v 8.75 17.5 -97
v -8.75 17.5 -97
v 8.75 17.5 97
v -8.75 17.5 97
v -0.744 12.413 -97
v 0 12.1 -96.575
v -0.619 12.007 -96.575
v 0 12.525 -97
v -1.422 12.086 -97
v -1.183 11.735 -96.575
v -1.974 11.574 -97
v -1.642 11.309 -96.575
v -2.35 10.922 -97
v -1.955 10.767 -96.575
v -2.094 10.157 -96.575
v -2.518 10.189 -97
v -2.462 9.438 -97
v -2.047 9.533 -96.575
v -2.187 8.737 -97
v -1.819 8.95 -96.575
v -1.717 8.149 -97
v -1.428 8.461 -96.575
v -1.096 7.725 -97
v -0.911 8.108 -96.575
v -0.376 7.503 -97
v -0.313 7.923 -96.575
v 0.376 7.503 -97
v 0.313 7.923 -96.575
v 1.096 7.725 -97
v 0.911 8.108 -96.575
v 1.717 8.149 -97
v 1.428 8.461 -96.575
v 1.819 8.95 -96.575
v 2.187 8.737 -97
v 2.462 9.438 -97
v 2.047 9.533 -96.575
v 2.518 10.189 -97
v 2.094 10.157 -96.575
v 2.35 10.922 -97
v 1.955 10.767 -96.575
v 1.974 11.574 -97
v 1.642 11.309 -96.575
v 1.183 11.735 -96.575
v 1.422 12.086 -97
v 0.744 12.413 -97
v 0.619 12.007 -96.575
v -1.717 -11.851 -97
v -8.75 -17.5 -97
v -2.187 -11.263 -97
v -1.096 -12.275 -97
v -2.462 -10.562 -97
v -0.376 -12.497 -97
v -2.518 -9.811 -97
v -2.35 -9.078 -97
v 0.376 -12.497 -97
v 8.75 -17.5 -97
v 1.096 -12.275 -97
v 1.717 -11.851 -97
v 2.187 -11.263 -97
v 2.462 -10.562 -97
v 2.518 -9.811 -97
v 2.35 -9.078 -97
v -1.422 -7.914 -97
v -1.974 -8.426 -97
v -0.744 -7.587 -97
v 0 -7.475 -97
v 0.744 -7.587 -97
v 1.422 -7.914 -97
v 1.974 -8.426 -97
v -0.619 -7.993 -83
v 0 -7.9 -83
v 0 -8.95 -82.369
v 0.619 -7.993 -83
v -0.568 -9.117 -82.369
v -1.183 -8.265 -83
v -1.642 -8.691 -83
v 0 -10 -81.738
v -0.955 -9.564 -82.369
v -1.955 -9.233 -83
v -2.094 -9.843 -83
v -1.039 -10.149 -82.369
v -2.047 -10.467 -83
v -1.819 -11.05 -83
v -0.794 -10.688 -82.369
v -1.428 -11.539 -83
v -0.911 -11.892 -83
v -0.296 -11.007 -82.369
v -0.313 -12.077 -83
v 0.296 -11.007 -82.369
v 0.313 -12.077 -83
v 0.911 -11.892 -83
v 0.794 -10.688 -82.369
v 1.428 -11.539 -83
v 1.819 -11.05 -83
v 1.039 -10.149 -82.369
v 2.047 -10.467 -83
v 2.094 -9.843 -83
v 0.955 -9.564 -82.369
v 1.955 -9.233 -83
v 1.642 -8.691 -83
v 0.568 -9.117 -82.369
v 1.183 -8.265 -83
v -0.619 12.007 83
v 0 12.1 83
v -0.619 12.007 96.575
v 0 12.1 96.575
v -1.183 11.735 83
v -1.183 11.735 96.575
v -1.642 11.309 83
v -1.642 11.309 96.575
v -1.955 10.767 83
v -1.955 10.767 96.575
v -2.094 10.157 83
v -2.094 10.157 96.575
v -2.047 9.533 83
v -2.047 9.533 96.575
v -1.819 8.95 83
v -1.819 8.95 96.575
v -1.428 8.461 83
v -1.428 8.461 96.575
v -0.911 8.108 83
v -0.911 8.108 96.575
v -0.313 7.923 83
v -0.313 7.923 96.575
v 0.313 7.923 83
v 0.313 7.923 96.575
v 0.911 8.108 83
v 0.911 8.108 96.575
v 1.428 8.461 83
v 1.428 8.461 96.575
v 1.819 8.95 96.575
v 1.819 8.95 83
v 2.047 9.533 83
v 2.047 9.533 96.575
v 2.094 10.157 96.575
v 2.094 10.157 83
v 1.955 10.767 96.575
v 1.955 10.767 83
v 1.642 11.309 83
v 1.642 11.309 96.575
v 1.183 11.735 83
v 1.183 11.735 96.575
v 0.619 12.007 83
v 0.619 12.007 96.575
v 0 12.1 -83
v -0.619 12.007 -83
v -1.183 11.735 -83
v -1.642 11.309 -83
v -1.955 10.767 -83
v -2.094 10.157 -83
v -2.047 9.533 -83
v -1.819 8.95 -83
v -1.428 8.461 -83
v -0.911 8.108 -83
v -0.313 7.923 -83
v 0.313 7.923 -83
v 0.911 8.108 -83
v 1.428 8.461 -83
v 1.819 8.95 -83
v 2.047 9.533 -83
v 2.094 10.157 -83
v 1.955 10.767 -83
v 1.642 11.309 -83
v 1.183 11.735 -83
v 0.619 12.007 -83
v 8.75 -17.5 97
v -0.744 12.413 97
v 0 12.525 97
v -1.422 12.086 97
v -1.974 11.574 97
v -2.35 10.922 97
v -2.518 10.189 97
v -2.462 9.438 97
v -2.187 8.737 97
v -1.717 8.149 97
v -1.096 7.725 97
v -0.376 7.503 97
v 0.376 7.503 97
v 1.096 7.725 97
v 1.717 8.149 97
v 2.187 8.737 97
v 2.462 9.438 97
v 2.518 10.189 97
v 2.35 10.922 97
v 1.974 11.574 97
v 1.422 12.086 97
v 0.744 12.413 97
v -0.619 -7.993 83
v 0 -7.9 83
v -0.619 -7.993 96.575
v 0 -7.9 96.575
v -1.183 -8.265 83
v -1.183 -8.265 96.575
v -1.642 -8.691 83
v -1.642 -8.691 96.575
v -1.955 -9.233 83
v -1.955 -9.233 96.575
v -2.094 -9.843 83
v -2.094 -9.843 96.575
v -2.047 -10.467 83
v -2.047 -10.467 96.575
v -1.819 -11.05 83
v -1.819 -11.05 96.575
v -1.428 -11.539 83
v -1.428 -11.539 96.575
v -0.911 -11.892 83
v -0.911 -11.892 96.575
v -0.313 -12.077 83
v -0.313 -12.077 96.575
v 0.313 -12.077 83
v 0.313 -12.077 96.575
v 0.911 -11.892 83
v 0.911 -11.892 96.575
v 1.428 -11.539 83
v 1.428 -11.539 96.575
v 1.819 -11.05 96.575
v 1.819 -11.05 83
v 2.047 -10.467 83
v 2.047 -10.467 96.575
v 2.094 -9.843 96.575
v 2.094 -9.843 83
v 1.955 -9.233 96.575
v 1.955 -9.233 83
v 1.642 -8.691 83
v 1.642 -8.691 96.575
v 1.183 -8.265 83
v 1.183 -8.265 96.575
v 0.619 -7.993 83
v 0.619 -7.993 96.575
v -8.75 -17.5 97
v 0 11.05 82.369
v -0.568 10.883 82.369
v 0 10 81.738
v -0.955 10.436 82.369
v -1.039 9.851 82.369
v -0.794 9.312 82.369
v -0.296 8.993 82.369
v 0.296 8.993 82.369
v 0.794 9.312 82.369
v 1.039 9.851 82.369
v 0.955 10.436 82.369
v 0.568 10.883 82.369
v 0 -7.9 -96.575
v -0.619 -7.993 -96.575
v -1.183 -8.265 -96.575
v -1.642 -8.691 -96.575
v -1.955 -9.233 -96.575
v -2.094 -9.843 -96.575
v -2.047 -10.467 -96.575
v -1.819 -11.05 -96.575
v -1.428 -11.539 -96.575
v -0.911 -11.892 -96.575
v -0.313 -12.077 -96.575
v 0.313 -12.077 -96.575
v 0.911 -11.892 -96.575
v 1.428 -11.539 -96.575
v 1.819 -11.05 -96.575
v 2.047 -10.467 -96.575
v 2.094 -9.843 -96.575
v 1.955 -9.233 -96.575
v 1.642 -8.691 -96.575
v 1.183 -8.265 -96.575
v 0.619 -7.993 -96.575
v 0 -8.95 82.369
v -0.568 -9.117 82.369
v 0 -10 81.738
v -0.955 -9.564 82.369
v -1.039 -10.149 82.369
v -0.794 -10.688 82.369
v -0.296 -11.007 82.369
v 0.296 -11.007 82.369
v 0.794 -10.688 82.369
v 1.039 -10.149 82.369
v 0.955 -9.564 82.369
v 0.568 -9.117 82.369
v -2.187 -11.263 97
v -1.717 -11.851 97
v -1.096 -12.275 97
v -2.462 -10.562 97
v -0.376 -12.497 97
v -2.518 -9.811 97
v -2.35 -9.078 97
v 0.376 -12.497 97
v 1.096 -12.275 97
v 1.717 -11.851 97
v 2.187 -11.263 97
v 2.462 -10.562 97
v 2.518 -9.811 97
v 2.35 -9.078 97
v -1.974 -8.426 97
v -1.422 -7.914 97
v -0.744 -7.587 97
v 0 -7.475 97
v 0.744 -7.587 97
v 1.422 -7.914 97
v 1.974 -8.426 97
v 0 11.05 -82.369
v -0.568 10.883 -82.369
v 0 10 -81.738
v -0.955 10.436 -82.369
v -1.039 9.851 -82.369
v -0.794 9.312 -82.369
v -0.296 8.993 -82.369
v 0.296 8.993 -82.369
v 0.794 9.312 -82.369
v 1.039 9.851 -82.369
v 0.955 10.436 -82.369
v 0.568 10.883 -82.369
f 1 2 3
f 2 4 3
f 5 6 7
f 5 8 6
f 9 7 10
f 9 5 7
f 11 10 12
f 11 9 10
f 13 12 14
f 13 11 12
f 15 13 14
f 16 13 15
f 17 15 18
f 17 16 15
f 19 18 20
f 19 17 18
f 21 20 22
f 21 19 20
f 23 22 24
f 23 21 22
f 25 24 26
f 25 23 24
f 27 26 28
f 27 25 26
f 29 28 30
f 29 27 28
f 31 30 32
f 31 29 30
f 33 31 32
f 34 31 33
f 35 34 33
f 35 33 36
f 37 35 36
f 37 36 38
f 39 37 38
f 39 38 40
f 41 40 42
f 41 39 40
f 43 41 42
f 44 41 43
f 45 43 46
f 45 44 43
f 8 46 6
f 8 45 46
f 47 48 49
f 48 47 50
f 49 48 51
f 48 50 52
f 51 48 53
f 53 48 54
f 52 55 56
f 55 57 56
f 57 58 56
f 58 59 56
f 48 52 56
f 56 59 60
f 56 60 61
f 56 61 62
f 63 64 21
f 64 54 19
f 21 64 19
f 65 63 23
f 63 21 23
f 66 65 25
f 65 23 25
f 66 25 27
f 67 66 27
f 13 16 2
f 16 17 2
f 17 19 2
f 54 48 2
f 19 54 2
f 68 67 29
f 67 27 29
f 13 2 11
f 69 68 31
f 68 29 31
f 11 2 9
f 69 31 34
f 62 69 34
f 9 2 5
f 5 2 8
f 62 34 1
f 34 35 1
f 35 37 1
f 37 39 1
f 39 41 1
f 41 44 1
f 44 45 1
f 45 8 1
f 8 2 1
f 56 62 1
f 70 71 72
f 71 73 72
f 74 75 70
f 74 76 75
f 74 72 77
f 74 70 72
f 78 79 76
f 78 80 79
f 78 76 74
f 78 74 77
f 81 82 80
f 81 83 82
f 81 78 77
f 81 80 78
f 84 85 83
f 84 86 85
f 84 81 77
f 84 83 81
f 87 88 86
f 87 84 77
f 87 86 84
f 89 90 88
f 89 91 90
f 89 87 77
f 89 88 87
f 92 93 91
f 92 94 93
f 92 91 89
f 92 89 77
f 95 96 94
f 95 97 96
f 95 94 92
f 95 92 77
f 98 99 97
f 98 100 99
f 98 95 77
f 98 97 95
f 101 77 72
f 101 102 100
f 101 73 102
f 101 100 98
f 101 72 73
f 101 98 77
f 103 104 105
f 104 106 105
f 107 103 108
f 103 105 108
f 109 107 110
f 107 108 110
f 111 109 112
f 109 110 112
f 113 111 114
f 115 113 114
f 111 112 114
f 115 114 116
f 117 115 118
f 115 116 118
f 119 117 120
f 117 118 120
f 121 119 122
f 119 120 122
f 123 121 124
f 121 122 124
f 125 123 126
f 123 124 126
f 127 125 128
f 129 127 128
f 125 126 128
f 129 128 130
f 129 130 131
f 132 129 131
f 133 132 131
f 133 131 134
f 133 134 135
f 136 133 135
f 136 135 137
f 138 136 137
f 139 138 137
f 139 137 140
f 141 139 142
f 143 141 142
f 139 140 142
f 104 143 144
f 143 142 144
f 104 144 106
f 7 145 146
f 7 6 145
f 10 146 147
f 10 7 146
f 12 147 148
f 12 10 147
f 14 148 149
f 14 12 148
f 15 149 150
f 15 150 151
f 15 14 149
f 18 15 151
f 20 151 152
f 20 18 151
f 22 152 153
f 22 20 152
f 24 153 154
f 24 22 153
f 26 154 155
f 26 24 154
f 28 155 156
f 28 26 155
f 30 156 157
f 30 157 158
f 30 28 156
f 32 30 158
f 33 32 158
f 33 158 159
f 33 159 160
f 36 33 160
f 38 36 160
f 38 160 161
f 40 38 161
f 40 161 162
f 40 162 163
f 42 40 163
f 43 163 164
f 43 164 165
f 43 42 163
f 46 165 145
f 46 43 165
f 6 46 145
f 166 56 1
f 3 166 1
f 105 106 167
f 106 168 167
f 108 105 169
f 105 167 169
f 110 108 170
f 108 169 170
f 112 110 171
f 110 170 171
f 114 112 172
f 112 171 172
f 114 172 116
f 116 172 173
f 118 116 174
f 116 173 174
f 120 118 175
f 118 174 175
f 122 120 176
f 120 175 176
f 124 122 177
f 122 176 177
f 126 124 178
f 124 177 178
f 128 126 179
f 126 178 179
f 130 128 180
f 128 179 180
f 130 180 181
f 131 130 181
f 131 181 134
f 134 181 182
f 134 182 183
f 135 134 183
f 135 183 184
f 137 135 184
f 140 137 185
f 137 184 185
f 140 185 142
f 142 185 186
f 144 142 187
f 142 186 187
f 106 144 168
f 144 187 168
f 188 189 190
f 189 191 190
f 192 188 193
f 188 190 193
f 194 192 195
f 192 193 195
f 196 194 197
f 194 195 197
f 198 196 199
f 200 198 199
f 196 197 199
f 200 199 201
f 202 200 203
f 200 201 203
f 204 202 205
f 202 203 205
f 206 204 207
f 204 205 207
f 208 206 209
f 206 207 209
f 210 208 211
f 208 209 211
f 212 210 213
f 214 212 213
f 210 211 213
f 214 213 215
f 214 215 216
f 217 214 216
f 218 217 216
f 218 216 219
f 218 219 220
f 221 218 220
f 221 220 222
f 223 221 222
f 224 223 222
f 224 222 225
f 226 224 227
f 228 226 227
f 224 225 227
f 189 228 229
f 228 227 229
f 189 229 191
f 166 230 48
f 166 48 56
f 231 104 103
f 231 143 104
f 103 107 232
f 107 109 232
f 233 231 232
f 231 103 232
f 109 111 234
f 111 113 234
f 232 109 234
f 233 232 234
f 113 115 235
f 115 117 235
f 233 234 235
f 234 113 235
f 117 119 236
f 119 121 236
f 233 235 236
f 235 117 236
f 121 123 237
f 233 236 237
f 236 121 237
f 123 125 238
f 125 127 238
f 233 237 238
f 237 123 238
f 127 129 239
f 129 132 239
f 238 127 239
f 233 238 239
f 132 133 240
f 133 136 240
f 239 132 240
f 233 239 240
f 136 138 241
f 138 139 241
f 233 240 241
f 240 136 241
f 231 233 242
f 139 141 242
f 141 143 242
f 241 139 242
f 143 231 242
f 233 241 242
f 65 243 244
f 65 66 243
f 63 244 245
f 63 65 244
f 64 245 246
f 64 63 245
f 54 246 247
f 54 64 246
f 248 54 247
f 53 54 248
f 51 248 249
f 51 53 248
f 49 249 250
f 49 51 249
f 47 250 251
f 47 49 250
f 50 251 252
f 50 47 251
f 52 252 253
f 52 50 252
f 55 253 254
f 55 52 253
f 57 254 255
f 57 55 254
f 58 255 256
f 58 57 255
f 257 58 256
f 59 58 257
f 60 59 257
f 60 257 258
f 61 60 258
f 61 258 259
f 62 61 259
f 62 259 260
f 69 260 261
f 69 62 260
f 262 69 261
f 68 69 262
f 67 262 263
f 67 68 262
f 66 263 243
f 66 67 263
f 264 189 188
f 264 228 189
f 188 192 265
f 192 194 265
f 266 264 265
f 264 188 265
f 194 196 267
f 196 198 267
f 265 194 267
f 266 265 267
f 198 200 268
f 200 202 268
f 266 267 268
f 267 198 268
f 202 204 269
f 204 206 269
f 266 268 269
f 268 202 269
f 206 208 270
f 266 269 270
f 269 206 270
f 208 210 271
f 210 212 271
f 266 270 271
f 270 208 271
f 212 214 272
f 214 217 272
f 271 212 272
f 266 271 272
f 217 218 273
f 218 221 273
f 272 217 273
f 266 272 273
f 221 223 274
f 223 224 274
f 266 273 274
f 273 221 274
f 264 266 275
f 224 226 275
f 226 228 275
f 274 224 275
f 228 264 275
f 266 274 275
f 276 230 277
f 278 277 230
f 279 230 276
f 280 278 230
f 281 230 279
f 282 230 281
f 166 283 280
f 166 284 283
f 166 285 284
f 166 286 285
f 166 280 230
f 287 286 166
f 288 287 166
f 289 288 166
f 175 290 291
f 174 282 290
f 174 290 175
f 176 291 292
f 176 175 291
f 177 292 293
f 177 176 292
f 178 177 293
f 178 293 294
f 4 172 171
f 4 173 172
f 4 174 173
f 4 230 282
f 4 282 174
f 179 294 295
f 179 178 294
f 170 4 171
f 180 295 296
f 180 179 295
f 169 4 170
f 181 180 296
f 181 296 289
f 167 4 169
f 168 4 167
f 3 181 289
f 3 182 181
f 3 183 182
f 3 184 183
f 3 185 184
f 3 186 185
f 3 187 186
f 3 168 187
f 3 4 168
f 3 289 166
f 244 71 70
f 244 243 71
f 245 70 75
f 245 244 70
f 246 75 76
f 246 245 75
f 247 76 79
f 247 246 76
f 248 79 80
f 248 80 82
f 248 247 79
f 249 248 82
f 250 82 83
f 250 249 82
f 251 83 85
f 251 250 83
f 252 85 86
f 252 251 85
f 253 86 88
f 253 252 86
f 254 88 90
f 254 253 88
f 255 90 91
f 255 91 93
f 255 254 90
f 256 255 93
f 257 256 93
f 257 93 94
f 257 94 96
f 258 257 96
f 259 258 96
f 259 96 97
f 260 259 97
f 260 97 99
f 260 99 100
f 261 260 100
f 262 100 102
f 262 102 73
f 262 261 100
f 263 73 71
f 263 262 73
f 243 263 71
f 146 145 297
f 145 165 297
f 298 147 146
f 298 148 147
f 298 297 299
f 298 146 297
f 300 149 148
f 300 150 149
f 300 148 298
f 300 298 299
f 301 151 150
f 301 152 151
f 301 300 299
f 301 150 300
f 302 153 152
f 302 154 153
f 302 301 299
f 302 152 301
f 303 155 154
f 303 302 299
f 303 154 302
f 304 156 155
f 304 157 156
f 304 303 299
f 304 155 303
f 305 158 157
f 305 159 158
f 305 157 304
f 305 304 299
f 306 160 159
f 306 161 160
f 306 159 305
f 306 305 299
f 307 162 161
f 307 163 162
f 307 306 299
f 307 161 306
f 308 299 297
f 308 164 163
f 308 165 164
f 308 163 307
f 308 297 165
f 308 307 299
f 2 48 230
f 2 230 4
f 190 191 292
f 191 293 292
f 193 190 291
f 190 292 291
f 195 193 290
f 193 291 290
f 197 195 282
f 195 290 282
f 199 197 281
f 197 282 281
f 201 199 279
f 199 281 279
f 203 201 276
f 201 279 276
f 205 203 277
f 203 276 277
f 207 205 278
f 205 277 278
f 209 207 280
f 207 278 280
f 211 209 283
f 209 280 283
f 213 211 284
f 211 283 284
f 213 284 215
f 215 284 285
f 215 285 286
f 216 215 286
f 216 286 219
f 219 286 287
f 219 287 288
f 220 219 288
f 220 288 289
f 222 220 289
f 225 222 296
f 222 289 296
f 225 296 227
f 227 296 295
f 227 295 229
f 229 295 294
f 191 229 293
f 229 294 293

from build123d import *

# Parameters (mm, degrees)
SKETCH1_W                  = 17.5
SKETCH1_H                  = 35
BOSS_EXTRUDE1_DEPTH        = 97
M5_TAPPED_HOLE1_AT_2_COUNT = 2
M5_TAPPED_HOLE1_AT_2_PITCH = 20


with BuildPart() as part:
    # Sketch1 → Boss-Extrude1 (new, symmetric)
    with BuildSketch(Plane.XY):
        Rectangle(SKETCH1_W, SKETCH1_H)
    extrude(amount=BOSS_EXTRUDE1_DEPTH, both=True)

    # Sketch5 → M5 Tapped Hole1 (revolve, cut)
    with BuildSketch(Plane(origin=(0, 10, -97), x_dir=(0, 1, 0), z_dir=(1, 0, 0))):
        Polygon((0, 0), (0, 15.2618073), (2.1, 14), (2.1, 0.425), (2.525, 0), align=None)
    m5_tapped_hole1 = revolve(axis=Axis((0, 10, -103.35), (0, 0, 1)), mode=Mode.SUBTRACT)

    # M5 Tapped Hole1 at 2: M5 Tapped Hole1 ×2
    with Locations(*[(0, -i * M5_TAPPED_HOLE1_AT_2_PITCH, 0) for i in range(1, M5_TAPPED_HOLE1_AT_2_COUNT)]):
        add(m5_tapped_hole1, mode=Mode.SUBTRACT)

    # Mirror1: M5 Tapped Hole1 across plane
    add(m5_tapped_hole1.mirror(Plane.XY), mode=Mode.SUBTRACT)

    # Mirror1 copy 1 sketch → Mirror1 copy 1 (revolve, cut)
    with BuildSketch(Plane(origin=(0, -10, 97), x_dir=(0, 1, 0), z_dir=(1, 0, 0))):
        Polygon((0, 0), (0, -15.2618073), (2.1, -14), (2.1, -0.425), (2.525, 0), align=None)
    revolve(axis=Axis((0, -10, 103.35), (0, 0, 1)), mode=Mode.SUBTRACT)


solid = part.part
